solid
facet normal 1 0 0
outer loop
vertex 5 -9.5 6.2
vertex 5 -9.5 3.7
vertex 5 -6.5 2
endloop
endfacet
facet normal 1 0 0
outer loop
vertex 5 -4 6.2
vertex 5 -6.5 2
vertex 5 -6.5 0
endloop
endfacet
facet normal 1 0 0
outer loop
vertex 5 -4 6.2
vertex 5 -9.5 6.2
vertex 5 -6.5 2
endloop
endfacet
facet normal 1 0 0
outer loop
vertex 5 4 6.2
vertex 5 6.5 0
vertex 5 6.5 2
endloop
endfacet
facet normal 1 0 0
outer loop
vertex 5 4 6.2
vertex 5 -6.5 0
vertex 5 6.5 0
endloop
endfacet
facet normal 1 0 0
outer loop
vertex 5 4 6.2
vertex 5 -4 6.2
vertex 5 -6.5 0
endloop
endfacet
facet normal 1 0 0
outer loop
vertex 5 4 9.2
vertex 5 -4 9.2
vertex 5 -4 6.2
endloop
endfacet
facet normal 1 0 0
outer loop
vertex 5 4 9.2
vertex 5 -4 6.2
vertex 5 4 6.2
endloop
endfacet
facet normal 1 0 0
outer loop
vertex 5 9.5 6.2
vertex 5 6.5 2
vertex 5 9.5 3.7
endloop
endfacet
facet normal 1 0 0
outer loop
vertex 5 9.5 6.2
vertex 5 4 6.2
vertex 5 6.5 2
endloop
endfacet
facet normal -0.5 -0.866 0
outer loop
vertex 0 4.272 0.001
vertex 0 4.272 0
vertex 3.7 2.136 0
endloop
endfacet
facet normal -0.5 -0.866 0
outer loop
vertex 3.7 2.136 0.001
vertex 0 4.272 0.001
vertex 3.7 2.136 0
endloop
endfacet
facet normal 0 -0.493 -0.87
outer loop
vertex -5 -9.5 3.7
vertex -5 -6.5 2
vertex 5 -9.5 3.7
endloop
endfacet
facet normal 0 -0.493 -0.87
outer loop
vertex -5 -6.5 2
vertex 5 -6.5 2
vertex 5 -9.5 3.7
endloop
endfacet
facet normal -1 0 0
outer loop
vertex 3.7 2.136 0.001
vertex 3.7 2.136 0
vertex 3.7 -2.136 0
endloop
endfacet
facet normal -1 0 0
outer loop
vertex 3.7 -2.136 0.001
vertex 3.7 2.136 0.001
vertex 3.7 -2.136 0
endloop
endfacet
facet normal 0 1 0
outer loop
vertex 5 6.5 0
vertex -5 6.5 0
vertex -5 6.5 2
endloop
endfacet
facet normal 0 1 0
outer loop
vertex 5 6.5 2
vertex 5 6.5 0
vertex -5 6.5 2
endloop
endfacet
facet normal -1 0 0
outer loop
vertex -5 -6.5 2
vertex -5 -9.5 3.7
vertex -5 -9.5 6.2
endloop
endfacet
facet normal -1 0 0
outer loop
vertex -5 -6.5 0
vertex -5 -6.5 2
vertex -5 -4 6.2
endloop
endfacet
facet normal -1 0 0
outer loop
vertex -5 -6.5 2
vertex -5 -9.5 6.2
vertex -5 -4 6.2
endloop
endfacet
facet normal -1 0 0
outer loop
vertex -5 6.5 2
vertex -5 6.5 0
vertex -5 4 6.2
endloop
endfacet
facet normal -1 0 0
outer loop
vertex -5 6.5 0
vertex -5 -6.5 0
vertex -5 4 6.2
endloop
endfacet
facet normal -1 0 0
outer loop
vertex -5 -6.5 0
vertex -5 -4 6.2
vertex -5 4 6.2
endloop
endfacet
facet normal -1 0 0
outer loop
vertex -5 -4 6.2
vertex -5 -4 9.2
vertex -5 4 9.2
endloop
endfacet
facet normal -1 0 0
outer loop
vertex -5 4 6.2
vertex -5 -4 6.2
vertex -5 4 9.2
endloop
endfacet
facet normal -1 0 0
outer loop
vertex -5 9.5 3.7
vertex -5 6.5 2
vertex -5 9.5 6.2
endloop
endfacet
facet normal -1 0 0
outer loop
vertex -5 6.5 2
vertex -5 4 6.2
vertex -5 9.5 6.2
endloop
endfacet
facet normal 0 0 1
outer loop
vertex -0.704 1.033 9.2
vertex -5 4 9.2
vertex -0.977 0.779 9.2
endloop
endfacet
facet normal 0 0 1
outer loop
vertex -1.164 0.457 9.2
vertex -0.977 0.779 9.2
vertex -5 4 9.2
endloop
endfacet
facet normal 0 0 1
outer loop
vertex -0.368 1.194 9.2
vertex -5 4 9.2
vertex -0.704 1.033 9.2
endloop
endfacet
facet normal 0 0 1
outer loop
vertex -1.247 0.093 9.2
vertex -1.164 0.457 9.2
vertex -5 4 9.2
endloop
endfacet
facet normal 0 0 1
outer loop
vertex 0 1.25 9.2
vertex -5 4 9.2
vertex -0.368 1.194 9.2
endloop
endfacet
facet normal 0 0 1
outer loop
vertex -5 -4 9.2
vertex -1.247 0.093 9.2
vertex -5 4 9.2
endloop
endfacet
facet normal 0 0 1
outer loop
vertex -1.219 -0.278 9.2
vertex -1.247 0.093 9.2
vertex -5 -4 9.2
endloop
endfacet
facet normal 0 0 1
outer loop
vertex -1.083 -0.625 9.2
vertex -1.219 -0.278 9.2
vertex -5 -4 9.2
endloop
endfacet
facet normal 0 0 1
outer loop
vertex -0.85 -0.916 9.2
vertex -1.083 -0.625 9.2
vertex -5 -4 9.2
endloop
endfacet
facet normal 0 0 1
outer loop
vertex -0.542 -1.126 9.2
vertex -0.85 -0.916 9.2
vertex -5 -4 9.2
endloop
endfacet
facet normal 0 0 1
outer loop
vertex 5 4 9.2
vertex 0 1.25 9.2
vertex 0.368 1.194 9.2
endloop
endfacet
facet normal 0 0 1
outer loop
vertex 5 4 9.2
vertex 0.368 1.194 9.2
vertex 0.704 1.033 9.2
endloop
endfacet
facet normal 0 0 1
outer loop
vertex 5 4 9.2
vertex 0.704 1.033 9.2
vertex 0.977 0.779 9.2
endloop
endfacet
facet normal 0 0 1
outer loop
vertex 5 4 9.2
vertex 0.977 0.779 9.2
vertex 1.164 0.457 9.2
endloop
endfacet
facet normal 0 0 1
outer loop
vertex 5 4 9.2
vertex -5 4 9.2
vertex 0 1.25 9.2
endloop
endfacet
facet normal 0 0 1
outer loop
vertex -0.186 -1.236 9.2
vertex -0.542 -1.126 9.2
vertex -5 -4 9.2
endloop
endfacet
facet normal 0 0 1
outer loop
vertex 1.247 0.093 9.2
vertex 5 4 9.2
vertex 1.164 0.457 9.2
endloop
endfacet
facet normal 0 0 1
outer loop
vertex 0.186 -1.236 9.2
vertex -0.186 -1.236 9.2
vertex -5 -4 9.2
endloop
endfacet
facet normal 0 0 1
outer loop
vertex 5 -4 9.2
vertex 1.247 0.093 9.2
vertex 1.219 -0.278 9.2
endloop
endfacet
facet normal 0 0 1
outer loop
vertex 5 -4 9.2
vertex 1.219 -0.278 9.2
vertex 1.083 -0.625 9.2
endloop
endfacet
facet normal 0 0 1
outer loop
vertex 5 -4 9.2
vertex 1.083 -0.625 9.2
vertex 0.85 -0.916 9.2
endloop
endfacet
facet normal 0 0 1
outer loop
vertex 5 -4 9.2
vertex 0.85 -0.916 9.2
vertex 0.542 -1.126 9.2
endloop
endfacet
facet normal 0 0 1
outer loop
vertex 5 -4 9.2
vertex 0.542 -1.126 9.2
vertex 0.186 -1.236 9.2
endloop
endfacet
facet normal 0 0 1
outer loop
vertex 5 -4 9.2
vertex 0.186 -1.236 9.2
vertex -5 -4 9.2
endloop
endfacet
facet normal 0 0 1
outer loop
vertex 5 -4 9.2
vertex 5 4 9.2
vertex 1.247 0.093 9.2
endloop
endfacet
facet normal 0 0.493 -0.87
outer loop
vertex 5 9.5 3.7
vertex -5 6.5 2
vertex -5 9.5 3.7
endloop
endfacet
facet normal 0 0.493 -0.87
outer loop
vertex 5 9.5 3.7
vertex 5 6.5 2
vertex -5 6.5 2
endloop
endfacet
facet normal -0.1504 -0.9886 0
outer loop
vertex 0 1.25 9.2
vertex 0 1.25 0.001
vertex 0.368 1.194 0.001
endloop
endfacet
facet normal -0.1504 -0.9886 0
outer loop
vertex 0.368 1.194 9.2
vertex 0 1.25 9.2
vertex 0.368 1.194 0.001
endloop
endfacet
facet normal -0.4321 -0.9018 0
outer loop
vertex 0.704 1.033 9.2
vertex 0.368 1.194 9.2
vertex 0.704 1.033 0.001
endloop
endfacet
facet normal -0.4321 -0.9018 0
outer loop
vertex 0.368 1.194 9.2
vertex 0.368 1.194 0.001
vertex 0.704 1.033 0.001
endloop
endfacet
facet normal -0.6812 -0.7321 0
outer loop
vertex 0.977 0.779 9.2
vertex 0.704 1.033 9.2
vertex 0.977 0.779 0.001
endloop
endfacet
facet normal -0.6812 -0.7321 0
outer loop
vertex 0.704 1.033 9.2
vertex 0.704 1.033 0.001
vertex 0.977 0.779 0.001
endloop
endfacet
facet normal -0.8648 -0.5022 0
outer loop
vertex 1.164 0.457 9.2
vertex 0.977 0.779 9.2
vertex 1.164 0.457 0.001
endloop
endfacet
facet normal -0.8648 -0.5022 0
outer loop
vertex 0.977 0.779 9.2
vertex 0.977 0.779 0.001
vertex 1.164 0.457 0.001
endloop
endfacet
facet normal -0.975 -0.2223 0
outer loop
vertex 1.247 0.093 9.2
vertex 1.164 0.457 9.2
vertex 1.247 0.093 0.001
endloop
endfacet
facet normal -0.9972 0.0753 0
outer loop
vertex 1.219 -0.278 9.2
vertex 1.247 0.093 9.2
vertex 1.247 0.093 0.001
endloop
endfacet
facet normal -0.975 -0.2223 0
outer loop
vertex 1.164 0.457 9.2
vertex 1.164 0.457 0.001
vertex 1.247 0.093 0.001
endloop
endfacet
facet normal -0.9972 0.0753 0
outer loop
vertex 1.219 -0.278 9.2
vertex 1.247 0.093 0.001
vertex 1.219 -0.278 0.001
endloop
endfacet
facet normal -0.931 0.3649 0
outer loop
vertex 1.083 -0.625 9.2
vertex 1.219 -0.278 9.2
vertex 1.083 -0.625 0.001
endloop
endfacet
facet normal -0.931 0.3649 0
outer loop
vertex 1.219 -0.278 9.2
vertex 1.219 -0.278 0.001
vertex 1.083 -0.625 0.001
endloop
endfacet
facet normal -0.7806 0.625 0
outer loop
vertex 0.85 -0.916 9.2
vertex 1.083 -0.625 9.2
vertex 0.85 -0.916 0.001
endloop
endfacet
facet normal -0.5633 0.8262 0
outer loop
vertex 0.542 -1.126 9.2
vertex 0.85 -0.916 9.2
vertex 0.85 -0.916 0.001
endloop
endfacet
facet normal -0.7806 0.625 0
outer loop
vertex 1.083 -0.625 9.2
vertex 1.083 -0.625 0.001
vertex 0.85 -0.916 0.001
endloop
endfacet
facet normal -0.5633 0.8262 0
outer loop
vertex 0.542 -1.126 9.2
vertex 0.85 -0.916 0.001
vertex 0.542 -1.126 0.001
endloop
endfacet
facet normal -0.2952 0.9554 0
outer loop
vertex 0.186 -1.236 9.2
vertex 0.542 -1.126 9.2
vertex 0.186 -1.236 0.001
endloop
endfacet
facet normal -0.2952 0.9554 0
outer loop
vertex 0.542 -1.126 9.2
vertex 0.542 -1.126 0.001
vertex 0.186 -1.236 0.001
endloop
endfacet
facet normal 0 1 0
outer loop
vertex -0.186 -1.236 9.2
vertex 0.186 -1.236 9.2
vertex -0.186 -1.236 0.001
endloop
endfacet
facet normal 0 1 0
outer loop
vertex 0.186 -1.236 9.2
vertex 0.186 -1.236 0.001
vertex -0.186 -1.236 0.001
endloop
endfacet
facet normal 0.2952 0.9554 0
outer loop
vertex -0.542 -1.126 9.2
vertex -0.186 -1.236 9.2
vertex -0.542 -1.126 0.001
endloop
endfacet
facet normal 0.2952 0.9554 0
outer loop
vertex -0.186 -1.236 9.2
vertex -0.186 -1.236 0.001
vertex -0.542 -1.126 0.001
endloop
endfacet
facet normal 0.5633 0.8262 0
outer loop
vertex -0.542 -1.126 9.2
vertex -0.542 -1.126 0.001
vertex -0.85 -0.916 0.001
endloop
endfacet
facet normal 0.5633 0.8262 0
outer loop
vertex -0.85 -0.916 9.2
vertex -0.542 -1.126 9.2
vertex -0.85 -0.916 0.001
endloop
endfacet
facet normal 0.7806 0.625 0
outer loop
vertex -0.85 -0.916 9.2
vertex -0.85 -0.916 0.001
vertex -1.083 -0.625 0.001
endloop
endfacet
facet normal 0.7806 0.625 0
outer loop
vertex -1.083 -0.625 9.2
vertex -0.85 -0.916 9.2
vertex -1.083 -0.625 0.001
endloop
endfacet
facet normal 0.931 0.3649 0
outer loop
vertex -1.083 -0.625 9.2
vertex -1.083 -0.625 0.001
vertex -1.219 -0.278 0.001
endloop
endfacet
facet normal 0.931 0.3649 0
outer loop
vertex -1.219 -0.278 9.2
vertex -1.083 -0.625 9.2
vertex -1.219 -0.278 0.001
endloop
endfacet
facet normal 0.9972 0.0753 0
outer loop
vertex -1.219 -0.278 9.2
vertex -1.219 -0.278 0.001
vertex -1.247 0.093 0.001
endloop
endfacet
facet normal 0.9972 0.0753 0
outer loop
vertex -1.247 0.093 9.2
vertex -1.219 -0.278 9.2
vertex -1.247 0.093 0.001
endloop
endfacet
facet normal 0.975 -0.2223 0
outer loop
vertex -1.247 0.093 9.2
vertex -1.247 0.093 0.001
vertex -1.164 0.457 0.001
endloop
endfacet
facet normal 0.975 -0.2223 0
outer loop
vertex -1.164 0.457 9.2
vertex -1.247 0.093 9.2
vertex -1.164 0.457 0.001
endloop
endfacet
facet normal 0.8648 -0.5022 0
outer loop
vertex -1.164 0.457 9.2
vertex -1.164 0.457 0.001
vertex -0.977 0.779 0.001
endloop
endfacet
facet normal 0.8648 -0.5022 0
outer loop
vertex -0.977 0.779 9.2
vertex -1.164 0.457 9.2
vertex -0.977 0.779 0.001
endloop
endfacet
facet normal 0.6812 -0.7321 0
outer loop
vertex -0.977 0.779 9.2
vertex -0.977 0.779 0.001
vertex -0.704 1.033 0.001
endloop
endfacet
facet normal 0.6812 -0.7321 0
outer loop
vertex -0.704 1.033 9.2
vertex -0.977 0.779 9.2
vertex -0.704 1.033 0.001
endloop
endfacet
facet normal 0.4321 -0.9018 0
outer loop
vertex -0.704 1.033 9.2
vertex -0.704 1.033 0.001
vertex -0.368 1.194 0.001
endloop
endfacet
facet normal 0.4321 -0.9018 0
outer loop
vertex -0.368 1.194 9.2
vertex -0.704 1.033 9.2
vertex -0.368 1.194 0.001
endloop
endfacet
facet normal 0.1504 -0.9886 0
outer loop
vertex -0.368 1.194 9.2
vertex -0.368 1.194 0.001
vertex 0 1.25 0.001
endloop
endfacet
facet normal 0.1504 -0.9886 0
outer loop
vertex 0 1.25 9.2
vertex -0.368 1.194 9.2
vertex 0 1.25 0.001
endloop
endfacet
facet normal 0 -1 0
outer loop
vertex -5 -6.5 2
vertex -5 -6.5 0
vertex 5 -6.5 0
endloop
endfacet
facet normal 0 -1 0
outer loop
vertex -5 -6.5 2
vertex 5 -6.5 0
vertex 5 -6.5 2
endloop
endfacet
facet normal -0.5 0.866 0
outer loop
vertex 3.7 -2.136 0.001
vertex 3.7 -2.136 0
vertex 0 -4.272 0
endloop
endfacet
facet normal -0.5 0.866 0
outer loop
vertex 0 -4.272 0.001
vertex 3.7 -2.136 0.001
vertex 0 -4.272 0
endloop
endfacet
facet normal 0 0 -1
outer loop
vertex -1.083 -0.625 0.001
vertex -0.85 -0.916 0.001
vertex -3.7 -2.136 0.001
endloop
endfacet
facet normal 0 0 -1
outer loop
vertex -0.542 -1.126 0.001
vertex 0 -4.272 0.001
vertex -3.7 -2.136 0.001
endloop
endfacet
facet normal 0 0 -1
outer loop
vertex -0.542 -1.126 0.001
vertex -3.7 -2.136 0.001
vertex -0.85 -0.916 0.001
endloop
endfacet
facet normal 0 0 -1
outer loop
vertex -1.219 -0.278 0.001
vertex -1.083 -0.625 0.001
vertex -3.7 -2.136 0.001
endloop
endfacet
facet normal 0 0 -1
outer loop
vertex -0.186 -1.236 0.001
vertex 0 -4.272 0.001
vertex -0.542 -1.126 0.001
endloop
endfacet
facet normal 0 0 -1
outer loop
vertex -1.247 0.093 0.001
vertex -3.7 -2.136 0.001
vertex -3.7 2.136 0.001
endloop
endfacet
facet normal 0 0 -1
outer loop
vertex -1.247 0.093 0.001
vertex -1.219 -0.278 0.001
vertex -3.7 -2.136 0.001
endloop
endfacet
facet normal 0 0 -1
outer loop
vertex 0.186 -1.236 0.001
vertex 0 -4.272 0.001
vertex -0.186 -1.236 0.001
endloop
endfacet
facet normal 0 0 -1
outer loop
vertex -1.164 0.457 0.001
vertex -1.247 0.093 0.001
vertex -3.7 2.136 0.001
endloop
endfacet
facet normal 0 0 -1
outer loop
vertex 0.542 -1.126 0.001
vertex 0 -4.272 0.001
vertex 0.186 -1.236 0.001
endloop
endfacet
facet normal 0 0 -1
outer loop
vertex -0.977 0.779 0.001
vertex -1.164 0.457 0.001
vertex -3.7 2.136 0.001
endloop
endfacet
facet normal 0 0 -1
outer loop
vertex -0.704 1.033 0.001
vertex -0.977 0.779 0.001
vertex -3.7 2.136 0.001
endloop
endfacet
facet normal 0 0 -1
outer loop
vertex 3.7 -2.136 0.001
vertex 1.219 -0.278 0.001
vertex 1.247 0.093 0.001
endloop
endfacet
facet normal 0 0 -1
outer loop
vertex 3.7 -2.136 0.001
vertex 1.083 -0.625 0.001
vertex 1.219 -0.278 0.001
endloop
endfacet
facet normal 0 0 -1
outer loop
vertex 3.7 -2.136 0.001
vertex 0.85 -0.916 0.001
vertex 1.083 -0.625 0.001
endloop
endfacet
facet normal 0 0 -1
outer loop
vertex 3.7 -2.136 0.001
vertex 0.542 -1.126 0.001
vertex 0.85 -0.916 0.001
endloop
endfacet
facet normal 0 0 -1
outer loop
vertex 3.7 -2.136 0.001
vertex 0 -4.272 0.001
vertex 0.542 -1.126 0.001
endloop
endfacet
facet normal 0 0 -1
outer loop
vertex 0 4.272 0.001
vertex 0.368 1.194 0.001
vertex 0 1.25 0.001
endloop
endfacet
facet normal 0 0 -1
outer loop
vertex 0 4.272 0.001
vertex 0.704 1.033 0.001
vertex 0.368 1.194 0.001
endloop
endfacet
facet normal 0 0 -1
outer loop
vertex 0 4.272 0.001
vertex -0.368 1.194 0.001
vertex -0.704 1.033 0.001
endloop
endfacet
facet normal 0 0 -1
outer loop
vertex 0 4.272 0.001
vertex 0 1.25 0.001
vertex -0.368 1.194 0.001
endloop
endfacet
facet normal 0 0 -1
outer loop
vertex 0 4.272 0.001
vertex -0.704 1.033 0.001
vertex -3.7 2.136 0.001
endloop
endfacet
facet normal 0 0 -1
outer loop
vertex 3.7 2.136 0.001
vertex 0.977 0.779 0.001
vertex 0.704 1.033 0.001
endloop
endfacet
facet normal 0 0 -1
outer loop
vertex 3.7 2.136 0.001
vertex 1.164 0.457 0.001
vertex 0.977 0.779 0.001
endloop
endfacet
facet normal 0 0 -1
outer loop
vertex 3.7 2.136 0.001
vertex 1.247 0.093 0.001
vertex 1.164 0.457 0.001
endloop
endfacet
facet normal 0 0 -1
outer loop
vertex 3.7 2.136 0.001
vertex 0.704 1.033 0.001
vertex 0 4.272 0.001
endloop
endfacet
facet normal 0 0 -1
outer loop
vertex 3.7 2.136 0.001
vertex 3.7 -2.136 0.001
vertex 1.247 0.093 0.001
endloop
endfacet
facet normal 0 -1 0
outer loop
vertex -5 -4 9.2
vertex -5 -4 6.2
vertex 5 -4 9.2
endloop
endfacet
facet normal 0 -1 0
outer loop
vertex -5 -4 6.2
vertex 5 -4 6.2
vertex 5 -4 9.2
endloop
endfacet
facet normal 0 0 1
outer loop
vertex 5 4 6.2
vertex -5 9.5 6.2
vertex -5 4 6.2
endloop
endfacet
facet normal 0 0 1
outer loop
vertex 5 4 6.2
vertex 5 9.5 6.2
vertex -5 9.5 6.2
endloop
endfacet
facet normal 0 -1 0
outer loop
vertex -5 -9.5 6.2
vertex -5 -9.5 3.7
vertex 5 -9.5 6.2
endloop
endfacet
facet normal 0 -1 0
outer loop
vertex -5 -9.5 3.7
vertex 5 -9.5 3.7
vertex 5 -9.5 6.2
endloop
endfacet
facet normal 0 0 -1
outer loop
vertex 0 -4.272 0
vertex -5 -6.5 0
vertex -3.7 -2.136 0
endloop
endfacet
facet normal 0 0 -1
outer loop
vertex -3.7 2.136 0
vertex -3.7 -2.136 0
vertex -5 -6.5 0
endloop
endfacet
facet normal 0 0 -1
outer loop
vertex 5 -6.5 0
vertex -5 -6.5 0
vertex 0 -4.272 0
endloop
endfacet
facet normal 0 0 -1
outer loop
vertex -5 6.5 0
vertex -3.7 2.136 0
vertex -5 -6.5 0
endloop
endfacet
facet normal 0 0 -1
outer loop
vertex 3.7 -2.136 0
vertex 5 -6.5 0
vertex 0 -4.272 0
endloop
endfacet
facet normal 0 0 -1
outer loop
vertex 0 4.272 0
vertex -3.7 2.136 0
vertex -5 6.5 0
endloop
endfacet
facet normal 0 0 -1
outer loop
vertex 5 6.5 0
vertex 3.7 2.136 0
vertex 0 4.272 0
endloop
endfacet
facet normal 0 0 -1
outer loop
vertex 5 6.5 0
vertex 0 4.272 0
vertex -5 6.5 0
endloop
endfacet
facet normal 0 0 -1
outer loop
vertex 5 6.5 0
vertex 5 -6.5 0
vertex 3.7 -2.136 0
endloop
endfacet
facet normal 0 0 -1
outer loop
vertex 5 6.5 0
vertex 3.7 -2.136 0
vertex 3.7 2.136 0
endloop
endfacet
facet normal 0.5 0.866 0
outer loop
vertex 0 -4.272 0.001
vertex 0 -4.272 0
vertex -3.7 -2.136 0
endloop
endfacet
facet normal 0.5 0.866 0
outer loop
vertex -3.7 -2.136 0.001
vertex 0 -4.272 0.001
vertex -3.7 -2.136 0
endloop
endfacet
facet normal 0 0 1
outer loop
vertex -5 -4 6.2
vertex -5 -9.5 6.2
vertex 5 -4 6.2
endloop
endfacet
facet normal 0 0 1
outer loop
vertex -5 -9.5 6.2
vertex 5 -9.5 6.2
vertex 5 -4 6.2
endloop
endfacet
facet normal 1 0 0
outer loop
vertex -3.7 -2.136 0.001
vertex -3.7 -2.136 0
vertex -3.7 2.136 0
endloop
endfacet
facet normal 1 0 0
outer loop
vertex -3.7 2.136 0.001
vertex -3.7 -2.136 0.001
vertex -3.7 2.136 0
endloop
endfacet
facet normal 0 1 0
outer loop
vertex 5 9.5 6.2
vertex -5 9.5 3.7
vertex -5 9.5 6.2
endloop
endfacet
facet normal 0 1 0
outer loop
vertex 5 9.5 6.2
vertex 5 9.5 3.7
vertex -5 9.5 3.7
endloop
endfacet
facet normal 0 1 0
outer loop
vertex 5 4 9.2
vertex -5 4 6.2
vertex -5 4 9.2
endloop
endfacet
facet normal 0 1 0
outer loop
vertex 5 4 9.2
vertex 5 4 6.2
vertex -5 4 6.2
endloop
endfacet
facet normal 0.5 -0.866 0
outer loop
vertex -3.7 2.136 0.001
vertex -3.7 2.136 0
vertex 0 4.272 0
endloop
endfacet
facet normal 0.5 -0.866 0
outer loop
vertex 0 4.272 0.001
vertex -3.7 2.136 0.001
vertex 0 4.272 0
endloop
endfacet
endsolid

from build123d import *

# Parameters (mm, degrees)
PAD005_DEPTH    = 5
POCKET002_DEPTH = 0.001
SKETCH010_R     = 1.25
POCKET003_DEPTH = 9.2


with BuildPart() as part:
    # Sketch008 → Pad005 (new body, symmetric)
    with BuildSketch(Plane.YZ):
        Polygon((-6.5, 0), (-6.5, 2), (-9.5, 3.7), (-9.5, 6.2), (-4, 6.2), (-4, 9.2), (0, 9.2), (0, 0), align=None)
    pad005 = extrude(amount=PAD005_DEPTH, both=True)

    # Mirrored: Pad005 across Sketch008 V_Axis
    add(pad005.mirror(Plane(origin=(0, 0, 0), x_dir=(1, 0, 0), z_dir=(0, 1, 0))))

    # Sketch009 (on Face2 of Mirrored) → Pocket002 (cut)
    with BuildSketch(Plane.YX):
        Polygon((-2.136196, 3.7), (-4.272392, 0), (-2.136196, -3.7), (2.136196, -3.7), (4.272392, 0), (2.136196, 3.7), align=None)
    extrude(amount=-POCKET002_DEPTH, mode=Mode.SUBTRACT)

    # Sketch010 (on Face20 of Pocket002) → Pocket003 (cut, through all)
    with BuildSketch(Plane.YX.offset(-0.001)):
        Circle(SKETCH010_R)
    extrude(amount=-POCKET003_DEPTH, mode=Mode.SUBTRACT)


solid = part.part
